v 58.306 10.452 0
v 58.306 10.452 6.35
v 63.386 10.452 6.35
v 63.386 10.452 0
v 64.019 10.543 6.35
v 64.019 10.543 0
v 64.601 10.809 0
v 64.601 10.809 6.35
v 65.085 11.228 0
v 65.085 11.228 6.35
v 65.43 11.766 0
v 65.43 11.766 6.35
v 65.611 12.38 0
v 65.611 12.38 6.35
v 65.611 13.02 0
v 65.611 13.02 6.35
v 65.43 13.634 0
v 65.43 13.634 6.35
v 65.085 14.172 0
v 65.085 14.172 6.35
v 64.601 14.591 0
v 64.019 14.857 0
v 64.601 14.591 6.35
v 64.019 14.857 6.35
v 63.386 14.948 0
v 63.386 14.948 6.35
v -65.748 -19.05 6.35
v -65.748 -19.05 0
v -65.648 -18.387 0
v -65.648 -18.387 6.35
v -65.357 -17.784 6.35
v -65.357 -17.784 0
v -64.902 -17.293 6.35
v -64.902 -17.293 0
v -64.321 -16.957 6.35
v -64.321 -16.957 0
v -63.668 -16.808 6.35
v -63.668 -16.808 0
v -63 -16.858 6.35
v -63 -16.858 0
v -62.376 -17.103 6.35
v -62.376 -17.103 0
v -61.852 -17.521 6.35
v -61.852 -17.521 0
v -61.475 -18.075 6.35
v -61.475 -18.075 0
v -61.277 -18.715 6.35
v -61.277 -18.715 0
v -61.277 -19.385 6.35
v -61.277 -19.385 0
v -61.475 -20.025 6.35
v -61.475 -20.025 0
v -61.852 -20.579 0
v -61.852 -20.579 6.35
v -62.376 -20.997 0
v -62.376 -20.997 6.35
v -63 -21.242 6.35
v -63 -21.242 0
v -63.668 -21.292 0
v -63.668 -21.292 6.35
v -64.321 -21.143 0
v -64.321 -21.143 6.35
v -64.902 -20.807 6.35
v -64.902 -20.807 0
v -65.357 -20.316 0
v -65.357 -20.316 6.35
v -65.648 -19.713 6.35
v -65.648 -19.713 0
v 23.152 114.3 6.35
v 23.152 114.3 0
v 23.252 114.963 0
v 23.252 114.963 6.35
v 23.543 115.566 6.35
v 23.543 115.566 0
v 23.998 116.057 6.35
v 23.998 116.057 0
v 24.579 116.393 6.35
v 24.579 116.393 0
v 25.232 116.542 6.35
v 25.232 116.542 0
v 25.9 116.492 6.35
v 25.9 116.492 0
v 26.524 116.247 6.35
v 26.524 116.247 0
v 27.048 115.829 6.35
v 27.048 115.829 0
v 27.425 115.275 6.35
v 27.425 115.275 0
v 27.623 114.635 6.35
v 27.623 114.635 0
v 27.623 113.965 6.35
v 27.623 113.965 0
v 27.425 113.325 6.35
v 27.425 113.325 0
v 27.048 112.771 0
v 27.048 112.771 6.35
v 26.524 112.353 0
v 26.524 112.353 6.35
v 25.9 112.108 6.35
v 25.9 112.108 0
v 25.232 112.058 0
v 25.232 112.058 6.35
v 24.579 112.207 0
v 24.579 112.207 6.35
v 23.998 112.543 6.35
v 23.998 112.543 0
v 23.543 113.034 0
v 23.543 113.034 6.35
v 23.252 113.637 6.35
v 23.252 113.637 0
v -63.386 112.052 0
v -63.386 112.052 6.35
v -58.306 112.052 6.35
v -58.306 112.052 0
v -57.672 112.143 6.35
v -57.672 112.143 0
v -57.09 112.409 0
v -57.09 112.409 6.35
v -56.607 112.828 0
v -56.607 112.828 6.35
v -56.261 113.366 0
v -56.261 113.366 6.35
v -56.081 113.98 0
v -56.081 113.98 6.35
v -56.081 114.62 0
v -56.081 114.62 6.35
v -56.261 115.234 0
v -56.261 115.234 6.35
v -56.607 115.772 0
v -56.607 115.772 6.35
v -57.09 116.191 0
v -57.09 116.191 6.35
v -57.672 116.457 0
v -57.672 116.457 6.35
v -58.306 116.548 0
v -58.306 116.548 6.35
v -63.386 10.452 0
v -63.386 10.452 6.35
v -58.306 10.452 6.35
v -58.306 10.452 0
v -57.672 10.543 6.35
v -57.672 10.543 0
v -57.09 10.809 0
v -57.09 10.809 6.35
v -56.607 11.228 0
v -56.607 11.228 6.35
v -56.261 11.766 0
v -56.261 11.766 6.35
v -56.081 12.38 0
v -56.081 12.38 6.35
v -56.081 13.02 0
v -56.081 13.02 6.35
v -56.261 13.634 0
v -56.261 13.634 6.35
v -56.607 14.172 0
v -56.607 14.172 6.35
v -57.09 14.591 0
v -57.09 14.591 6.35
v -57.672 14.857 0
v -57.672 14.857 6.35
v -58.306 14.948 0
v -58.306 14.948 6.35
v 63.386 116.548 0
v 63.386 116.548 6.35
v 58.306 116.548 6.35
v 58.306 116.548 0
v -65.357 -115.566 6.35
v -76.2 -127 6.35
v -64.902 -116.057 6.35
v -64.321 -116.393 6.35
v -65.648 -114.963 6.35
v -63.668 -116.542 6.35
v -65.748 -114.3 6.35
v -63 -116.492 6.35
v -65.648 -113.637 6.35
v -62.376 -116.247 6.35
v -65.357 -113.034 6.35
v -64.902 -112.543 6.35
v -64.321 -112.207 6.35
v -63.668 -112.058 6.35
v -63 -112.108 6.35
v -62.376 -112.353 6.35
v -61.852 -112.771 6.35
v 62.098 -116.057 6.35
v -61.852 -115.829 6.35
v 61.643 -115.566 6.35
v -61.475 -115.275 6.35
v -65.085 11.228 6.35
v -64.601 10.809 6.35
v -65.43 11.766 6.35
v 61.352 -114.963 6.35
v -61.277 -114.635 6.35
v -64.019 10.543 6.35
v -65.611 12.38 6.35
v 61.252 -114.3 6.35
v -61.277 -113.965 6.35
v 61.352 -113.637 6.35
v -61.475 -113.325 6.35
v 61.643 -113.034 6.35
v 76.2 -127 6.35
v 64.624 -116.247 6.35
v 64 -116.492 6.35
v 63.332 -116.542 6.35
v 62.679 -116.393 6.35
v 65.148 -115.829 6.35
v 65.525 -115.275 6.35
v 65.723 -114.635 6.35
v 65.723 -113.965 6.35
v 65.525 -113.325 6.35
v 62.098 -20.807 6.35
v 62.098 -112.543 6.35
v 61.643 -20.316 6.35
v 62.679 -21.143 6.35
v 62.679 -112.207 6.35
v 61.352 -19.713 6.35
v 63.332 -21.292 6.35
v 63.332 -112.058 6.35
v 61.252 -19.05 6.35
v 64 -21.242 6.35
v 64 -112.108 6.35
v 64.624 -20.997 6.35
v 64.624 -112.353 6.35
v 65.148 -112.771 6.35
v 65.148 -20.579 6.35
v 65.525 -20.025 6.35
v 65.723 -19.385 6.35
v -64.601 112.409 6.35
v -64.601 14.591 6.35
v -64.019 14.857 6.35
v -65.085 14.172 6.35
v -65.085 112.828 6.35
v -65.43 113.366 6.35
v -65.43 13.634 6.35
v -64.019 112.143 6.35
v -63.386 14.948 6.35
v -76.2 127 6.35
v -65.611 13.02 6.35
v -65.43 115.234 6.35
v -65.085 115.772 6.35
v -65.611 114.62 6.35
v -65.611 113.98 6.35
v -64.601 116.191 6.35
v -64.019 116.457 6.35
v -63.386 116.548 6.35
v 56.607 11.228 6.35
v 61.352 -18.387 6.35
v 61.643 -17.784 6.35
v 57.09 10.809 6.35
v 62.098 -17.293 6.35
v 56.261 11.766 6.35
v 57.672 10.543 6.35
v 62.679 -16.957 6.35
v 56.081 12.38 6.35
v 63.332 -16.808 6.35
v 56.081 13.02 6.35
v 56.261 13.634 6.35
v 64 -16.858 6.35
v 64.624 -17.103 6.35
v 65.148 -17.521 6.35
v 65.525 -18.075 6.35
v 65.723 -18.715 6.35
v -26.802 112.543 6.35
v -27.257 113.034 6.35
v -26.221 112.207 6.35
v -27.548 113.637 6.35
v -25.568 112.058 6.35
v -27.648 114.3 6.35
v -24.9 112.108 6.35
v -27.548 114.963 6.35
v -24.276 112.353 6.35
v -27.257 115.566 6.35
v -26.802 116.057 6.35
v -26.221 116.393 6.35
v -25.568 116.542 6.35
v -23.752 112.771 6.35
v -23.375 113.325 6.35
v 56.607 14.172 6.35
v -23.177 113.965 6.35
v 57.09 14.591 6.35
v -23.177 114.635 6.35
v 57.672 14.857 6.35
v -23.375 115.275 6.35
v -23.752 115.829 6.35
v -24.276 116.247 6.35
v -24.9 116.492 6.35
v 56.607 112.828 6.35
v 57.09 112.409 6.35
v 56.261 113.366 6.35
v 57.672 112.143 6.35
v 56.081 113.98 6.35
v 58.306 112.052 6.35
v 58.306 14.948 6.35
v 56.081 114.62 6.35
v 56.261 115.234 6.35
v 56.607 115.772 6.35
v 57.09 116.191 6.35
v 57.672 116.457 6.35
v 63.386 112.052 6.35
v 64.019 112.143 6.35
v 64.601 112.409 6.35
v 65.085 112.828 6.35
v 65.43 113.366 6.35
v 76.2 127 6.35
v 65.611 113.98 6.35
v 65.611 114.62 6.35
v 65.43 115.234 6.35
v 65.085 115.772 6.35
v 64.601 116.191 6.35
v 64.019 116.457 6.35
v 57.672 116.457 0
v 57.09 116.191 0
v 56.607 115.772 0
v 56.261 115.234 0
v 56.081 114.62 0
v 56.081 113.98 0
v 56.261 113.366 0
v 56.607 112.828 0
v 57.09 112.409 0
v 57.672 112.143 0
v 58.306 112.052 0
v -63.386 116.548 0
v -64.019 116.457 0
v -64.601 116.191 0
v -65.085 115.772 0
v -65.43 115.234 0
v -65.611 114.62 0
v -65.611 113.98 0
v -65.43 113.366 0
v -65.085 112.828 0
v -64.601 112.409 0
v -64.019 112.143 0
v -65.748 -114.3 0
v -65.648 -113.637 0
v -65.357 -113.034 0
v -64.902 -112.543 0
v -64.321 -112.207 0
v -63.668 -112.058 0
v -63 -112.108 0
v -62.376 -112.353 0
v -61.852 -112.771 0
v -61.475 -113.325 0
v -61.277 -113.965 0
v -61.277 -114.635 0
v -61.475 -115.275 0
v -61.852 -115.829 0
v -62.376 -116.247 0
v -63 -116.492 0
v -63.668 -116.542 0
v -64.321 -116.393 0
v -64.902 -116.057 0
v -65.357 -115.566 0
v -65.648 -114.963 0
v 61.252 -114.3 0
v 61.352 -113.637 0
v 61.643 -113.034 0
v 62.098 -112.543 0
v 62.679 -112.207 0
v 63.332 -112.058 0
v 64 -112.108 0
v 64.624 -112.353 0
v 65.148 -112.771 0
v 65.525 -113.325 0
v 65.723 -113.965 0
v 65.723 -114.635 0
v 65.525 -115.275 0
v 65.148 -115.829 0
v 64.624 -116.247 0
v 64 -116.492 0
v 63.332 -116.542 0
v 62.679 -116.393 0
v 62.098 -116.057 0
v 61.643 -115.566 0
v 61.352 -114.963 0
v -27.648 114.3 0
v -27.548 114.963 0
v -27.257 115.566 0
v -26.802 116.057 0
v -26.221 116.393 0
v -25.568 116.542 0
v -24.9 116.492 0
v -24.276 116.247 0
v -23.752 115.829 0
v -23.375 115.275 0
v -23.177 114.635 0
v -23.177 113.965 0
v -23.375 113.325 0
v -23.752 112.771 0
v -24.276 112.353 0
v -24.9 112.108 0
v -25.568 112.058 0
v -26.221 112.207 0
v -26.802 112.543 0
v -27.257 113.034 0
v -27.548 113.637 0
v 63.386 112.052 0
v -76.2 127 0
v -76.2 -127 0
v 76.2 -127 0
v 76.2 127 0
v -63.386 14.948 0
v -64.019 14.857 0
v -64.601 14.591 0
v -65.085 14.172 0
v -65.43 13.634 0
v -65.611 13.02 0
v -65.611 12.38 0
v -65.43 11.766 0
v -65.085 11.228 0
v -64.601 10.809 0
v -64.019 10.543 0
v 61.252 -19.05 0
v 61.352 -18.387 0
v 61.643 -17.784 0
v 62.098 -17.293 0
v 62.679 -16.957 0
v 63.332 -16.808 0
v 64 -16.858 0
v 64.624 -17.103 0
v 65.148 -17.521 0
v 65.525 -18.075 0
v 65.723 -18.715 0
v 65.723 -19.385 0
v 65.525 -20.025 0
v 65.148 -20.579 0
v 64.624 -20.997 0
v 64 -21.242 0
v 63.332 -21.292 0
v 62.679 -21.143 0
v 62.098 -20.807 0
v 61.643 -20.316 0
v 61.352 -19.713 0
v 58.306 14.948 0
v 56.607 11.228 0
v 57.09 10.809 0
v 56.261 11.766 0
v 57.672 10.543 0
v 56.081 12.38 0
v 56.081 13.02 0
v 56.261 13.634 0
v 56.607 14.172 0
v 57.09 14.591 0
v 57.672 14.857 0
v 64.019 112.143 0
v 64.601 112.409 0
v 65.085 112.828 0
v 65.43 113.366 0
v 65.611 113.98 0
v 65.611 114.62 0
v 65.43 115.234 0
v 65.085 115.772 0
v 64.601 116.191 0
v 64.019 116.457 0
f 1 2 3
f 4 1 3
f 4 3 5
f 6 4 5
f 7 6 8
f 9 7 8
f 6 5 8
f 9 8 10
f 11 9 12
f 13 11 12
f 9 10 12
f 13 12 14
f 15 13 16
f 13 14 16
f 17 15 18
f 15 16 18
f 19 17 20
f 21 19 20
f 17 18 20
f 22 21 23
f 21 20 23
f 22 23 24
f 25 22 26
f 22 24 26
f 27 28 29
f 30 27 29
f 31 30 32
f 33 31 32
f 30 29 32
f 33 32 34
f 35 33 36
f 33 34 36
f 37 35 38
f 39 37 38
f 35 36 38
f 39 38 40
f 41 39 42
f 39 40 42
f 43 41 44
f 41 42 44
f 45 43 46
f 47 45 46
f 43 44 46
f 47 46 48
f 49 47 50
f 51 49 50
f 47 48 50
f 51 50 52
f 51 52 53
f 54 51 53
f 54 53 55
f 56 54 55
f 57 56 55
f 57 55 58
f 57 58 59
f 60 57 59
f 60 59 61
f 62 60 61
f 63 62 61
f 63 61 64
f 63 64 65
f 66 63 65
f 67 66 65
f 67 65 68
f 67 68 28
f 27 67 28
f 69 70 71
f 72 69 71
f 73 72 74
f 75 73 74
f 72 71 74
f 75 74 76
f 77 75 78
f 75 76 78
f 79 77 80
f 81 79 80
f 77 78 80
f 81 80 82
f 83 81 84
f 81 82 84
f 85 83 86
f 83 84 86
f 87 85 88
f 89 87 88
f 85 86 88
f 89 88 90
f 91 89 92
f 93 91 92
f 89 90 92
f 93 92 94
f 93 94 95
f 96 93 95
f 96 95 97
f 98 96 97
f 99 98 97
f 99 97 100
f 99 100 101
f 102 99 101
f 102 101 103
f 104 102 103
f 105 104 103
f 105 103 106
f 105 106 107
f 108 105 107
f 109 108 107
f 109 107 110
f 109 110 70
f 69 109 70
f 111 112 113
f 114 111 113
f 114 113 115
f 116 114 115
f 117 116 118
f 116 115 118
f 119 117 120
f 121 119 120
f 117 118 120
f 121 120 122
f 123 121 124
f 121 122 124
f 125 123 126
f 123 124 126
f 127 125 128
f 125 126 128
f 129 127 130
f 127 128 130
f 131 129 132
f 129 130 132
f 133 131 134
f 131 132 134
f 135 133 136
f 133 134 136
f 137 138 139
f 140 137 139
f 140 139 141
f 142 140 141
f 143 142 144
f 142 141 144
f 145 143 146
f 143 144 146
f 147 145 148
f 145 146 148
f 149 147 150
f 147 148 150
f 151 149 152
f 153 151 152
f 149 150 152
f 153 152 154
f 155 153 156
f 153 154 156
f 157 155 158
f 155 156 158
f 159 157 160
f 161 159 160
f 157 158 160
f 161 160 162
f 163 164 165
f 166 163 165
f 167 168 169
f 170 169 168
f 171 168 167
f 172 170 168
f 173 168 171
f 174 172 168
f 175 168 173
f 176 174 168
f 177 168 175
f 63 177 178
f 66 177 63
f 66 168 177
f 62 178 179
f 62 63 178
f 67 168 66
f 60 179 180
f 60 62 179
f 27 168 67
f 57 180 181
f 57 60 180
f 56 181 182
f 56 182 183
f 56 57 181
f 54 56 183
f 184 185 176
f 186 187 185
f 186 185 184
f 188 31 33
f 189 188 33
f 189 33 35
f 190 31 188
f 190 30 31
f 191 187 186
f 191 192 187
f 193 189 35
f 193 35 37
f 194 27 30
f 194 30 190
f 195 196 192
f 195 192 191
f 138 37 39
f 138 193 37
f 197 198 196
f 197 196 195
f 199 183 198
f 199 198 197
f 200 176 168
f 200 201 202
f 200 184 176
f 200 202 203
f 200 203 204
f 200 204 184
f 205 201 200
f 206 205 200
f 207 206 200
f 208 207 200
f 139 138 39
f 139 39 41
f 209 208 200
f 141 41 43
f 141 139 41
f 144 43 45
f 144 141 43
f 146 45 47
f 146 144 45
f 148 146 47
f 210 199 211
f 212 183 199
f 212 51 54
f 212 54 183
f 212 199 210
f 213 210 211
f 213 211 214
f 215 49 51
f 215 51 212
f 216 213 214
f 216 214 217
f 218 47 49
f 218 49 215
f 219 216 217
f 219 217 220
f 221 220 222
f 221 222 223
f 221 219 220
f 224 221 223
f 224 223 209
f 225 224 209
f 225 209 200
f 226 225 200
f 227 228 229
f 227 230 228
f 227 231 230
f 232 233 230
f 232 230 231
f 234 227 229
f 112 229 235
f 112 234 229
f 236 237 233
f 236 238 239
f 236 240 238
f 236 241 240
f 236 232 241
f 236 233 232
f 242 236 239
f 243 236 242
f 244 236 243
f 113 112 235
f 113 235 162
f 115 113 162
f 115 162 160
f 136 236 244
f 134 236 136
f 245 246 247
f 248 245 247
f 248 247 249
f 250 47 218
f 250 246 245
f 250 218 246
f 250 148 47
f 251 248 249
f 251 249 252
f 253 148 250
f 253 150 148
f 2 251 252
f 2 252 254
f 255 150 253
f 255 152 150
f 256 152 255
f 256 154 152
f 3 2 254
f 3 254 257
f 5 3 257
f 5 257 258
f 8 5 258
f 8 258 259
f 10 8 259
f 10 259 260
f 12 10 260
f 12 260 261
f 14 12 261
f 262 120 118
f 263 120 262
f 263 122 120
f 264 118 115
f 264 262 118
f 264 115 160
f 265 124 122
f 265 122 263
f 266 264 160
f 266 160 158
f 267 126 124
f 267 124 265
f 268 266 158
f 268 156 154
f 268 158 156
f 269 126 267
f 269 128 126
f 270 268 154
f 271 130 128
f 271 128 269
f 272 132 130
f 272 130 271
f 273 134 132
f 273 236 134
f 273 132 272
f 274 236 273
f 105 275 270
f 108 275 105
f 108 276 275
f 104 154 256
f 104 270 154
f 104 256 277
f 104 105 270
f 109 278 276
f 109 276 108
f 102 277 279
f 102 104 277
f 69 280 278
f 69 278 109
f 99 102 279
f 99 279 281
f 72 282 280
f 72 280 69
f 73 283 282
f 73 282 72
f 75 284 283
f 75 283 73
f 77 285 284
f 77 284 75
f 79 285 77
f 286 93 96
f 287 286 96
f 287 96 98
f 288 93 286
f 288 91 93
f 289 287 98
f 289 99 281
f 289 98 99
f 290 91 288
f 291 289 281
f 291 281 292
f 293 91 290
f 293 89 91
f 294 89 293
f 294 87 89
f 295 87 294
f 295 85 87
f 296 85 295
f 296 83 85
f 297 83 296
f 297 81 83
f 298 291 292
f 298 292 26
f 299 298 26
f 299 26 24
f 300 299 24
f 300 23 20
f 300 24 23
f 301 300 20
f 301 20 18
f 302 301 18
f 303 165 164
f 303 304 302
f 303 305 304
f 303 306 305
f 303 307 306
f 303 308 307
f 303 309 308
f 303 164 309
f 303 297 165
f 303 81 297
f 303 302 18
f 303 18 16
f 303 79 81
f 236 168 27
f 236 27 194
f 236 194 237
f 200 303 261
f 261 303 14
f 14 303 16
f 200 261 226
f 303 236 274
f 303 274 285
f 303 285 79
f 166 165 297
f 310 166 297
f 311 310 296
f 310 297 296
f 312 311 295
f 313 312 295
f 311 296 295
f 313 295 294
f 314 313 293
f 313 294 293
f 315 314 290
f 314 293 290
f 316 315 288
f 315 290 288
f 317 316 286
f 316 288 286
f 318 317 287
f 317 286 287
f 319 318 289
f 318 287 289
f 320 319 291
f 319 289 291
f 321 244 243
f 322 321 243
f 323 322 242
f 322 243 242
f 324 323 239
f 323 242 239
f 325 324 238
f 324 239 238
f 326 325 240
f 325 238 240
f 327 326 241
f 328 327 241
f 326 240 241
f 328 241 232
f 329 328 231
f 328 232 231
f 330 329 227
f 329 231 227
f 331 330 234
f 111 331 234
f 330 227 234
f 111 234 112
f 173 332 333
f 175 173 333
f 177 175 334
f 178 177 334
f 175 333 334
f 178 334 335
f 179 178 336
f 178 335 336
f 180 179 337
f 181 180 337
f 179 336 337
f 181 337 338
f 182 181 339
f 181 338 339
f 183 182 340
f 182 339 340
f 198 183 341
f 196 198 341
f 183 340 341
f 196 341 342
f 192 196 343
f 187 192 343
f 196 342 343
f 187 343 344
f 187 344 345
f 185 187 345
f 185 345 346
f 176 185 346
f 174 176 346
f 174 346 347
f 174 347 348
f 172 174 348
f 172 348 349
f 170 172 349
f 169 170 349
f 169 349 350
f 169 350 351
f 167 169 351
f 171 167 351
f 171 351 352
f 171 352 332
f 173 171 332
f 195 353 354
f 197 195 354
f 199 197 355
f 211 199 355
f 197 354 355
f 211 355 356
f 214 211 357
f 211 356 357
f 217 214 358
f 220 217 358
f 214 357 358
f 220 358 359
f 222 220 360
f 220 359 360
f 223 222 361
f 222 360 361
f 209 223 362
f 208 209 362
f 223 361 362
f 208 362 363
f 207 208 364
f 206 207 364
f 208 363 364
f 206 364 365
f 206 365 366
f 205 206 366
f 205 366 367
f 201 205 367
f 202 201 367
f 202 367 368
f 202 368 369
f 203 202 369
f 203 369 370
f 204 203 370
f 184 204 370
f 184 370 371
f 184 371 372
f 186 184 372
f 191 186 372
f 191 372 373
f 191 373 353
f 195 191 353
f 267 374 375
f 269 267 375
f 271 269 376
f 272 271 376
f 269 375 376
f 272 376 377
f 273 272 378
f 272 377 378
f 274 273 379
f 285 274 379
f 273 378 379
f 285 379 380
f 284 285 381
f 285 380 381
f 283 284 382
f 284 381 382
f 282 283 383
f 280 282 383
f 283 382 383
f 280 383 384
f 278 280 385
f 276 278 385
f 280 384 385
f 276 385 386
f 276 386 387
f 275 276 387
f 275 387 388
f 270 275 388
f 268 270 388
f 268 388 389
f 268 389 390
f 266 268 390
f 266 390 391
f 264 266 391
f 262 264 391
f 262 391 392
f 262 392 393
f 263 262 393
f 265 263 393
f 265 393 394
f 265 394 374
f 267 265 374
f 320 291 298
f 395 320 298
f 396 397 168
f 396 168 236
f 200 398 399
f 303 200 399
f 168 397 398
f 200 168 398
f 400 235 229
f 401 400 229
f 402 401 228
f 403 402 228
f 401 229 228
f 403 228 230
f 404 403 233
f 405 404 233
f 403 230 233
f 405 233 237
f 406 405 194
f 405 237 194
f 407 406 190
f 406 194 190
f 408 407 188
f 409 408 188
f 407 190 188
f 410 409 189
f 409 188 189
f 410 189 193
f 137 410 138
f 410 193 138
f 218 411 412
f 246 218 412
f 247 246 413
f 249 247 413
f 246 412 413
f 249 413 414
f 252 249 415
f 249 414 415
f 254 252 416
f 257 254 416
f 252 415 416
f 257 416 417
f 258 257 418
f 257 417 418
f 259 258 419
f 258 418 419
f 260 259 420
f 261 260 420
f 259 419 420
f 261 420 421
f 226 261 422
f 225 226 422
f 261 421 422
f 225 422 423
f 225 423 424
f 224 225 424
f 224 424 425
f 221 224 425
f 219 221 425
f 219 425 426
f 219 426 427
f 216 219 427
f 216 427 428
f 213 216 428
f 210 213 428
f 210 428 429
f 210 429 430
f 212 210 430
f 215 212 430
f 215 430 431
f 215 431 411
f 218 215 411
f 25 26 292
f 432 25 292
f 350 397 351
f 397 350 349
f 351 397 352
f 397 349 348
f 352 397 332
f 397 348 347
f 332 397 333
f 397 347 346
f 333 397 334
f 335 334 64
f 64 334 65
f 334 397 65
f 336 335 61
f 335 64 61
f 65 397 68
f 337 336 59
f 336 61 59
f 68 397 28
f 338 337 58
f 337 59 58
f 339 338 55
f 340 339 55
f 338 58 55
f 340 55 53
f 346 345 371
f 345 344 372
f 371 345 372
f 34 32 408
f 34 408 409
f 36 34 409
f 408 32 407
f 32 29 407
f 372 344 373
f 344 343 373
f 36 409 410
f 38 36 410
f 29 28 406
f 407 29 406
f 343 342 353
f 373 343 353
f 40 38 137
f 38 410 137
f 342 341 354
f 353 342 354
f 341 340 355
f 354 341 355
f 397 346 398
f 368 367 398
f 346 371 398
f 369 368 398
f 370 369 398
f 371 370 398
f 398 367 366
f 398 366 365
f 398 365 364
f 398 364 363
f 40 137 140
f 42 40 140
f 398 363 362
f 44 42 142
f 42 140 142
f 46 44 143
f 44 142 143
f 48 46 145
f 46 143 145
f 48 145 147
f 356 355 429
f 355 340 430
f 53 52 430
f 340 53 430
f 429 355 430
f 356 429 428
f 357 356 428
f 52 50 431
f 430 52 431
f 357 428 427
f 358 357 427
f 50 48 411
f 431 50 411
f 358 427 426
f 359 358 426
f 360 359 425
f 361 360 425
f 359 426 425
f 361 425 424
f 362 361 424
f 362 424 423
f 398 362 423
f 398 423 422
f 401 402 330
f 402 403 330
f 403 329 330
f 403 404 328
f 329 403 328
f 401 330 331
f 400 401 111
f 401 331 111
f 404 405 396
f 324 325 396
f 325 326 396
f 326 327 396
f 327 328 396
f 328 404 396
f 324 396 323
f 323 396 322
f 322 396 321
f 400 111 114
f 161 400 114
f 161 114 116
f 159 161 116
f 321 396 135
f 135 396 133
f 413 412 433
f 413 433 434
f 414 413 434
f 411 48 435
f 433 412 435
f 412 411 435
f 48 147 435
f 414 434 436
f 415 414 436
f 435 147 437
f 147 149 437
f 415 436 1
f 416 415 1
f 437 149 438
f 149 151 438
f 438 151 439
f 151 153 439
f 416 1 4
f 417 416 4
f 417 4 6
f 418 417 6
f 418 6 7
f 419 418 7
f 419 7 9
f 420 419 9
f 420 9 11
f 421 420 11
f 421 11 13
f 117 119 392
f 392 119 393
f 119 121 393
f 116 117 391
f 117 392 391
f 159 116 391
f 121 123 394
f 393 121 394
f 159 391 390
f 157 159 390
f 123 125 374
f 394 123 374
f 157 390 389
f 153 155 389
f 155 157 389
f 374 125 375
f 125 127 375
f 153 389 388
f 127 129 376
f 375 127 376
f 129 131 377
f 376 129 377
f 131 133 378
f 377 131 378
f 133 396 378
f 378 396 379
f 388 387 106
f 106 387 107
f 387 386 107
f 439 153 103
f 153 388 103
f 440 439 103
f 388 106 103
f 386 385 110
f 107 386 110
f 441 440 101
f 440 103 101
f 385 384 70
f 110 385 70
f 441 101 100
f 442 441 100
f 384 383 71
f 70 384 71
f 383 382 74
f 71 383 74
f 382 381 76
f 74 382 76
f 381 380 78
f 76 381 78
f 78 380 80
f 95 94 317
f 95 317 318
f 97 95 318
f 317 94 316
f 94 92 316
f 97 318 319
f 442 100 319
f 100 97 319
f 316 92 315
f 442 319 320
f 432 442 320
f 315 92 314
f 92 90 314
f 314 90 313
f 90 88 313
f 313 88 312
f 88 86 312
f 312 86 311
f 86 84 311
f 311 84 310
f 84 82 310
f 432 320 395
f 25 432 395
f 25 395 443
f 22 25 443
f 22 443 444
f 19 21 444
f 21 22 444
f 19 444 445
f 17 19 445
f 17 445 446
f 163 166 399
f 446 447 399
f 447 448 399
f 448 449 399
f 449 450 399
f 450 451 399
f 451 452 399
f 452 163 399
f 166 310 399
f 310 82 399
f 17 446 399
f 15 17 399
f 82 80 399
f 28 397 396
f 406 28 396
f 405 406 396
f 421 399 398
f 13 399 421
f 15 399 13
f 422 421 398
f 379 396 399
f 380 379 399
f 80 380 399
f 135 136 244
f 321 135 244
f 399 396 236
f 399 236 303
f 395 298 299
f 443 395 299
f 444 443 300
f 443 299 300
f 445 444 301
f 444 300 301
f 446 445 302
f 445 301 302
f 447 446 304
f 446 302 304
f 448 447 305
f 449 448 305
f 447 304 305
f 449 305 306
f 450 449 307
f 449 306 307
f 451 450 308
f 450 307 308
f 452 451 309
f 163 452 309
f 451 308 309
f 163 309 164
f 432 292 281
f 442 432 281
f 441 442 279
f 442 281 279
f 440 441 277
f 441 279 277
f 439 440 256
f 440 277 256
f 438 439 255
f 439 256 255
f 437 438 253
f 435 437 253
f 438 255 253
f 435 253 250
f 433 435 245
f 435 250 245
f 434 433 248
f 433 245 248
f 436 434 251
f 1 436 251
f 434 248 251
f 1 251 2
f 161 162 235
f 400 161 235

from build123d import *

# Parameters (mm, degrees)
F0_W     = 152.4
F0_H     = 254
F1_DEPTH = 6.35
F3_DEPTH = 25.4
F6_D     = 4.4958


with BuildPart() as f1:
    # F0 (on Top) → F1 (new body)
    with BuildSketch(Plane.XY):
        Rectangle(F0_W, F0_H)
    extrude(amount=F1_DEPTH)

    # F2 (on face) → F3 (cut)
    with BuildSketch(Plane.XY.offset(6.35)):
        with BuildLine():
            Line((-58.3057, 116.5479), (-63.3857, 116.5479))
            ThreePointArc((-63.3857, 116.5479), (-65.6336, 114.3), (-63.3857, 112.0521))
            Line((-63.3857, 112.0521), (-58.3057, 112.0521))
            ThreePointArc((-58.3057, 112.0521), (-56.0578, 114.3), (-58.3057, 116.5479))
        make_face()
        with BuildLine():
            Line((63.3857, 116.5479), (58.3057, 116.5479))
            ThreePointArc((58.3057, 116.5479), (56.0578, 114.3), (58.3057, 112.0521))
            Line((58.3057, 112.0521), (63.3857, 112.0521))
            ThreePointArc((63.3857, 112.0521), (65.6336, 114.3), (63.3857, 116.5479))
        make_face()
        with BuildLine():
            Line((-58.3057, 14.9479), (-63.3857, 14.9479))
            ThreePointArc((-63.3857, 14.9479), (-65.6336, 12.7), (-63.3857, 10.4521))
            Line((-63.3857, 10.4521), (-58.3057, 10.4521))
            ThreePointArc((-58.3057, 10.4521), (-56.0578, 12.7), (-58.3057, 14.9479))
        make_face()
        with BuildLine():
            Line((63.3857, 14.9479), (58.3057, 14.9479))
            ThreePointArc((58.3057, 14.9479), (56.0578, 12.7), (58.3057, 10.4521))
            Line((58.3057, 10.4521), (63.3857, 10.4521))
            ThreePointArc((63.3857, 10.4521), (65.6336, 12.7), (63.3857, 14.9479))
        make_face()
    extrude(amount=-F3_DEPTH, mode=Mode.SUBTRACT)

    # F6 (through all)
    with Locations(Plane.XY.offset(6.35)):
        with Locations((-63.5, -19.05), (-63.5, -114.3), (63.5, -114.3), (63.5, -19.05), (-25.4, 114.3), (25.4, 114.3)):
            Hole(F6_D / 2)


solid = f1.part
